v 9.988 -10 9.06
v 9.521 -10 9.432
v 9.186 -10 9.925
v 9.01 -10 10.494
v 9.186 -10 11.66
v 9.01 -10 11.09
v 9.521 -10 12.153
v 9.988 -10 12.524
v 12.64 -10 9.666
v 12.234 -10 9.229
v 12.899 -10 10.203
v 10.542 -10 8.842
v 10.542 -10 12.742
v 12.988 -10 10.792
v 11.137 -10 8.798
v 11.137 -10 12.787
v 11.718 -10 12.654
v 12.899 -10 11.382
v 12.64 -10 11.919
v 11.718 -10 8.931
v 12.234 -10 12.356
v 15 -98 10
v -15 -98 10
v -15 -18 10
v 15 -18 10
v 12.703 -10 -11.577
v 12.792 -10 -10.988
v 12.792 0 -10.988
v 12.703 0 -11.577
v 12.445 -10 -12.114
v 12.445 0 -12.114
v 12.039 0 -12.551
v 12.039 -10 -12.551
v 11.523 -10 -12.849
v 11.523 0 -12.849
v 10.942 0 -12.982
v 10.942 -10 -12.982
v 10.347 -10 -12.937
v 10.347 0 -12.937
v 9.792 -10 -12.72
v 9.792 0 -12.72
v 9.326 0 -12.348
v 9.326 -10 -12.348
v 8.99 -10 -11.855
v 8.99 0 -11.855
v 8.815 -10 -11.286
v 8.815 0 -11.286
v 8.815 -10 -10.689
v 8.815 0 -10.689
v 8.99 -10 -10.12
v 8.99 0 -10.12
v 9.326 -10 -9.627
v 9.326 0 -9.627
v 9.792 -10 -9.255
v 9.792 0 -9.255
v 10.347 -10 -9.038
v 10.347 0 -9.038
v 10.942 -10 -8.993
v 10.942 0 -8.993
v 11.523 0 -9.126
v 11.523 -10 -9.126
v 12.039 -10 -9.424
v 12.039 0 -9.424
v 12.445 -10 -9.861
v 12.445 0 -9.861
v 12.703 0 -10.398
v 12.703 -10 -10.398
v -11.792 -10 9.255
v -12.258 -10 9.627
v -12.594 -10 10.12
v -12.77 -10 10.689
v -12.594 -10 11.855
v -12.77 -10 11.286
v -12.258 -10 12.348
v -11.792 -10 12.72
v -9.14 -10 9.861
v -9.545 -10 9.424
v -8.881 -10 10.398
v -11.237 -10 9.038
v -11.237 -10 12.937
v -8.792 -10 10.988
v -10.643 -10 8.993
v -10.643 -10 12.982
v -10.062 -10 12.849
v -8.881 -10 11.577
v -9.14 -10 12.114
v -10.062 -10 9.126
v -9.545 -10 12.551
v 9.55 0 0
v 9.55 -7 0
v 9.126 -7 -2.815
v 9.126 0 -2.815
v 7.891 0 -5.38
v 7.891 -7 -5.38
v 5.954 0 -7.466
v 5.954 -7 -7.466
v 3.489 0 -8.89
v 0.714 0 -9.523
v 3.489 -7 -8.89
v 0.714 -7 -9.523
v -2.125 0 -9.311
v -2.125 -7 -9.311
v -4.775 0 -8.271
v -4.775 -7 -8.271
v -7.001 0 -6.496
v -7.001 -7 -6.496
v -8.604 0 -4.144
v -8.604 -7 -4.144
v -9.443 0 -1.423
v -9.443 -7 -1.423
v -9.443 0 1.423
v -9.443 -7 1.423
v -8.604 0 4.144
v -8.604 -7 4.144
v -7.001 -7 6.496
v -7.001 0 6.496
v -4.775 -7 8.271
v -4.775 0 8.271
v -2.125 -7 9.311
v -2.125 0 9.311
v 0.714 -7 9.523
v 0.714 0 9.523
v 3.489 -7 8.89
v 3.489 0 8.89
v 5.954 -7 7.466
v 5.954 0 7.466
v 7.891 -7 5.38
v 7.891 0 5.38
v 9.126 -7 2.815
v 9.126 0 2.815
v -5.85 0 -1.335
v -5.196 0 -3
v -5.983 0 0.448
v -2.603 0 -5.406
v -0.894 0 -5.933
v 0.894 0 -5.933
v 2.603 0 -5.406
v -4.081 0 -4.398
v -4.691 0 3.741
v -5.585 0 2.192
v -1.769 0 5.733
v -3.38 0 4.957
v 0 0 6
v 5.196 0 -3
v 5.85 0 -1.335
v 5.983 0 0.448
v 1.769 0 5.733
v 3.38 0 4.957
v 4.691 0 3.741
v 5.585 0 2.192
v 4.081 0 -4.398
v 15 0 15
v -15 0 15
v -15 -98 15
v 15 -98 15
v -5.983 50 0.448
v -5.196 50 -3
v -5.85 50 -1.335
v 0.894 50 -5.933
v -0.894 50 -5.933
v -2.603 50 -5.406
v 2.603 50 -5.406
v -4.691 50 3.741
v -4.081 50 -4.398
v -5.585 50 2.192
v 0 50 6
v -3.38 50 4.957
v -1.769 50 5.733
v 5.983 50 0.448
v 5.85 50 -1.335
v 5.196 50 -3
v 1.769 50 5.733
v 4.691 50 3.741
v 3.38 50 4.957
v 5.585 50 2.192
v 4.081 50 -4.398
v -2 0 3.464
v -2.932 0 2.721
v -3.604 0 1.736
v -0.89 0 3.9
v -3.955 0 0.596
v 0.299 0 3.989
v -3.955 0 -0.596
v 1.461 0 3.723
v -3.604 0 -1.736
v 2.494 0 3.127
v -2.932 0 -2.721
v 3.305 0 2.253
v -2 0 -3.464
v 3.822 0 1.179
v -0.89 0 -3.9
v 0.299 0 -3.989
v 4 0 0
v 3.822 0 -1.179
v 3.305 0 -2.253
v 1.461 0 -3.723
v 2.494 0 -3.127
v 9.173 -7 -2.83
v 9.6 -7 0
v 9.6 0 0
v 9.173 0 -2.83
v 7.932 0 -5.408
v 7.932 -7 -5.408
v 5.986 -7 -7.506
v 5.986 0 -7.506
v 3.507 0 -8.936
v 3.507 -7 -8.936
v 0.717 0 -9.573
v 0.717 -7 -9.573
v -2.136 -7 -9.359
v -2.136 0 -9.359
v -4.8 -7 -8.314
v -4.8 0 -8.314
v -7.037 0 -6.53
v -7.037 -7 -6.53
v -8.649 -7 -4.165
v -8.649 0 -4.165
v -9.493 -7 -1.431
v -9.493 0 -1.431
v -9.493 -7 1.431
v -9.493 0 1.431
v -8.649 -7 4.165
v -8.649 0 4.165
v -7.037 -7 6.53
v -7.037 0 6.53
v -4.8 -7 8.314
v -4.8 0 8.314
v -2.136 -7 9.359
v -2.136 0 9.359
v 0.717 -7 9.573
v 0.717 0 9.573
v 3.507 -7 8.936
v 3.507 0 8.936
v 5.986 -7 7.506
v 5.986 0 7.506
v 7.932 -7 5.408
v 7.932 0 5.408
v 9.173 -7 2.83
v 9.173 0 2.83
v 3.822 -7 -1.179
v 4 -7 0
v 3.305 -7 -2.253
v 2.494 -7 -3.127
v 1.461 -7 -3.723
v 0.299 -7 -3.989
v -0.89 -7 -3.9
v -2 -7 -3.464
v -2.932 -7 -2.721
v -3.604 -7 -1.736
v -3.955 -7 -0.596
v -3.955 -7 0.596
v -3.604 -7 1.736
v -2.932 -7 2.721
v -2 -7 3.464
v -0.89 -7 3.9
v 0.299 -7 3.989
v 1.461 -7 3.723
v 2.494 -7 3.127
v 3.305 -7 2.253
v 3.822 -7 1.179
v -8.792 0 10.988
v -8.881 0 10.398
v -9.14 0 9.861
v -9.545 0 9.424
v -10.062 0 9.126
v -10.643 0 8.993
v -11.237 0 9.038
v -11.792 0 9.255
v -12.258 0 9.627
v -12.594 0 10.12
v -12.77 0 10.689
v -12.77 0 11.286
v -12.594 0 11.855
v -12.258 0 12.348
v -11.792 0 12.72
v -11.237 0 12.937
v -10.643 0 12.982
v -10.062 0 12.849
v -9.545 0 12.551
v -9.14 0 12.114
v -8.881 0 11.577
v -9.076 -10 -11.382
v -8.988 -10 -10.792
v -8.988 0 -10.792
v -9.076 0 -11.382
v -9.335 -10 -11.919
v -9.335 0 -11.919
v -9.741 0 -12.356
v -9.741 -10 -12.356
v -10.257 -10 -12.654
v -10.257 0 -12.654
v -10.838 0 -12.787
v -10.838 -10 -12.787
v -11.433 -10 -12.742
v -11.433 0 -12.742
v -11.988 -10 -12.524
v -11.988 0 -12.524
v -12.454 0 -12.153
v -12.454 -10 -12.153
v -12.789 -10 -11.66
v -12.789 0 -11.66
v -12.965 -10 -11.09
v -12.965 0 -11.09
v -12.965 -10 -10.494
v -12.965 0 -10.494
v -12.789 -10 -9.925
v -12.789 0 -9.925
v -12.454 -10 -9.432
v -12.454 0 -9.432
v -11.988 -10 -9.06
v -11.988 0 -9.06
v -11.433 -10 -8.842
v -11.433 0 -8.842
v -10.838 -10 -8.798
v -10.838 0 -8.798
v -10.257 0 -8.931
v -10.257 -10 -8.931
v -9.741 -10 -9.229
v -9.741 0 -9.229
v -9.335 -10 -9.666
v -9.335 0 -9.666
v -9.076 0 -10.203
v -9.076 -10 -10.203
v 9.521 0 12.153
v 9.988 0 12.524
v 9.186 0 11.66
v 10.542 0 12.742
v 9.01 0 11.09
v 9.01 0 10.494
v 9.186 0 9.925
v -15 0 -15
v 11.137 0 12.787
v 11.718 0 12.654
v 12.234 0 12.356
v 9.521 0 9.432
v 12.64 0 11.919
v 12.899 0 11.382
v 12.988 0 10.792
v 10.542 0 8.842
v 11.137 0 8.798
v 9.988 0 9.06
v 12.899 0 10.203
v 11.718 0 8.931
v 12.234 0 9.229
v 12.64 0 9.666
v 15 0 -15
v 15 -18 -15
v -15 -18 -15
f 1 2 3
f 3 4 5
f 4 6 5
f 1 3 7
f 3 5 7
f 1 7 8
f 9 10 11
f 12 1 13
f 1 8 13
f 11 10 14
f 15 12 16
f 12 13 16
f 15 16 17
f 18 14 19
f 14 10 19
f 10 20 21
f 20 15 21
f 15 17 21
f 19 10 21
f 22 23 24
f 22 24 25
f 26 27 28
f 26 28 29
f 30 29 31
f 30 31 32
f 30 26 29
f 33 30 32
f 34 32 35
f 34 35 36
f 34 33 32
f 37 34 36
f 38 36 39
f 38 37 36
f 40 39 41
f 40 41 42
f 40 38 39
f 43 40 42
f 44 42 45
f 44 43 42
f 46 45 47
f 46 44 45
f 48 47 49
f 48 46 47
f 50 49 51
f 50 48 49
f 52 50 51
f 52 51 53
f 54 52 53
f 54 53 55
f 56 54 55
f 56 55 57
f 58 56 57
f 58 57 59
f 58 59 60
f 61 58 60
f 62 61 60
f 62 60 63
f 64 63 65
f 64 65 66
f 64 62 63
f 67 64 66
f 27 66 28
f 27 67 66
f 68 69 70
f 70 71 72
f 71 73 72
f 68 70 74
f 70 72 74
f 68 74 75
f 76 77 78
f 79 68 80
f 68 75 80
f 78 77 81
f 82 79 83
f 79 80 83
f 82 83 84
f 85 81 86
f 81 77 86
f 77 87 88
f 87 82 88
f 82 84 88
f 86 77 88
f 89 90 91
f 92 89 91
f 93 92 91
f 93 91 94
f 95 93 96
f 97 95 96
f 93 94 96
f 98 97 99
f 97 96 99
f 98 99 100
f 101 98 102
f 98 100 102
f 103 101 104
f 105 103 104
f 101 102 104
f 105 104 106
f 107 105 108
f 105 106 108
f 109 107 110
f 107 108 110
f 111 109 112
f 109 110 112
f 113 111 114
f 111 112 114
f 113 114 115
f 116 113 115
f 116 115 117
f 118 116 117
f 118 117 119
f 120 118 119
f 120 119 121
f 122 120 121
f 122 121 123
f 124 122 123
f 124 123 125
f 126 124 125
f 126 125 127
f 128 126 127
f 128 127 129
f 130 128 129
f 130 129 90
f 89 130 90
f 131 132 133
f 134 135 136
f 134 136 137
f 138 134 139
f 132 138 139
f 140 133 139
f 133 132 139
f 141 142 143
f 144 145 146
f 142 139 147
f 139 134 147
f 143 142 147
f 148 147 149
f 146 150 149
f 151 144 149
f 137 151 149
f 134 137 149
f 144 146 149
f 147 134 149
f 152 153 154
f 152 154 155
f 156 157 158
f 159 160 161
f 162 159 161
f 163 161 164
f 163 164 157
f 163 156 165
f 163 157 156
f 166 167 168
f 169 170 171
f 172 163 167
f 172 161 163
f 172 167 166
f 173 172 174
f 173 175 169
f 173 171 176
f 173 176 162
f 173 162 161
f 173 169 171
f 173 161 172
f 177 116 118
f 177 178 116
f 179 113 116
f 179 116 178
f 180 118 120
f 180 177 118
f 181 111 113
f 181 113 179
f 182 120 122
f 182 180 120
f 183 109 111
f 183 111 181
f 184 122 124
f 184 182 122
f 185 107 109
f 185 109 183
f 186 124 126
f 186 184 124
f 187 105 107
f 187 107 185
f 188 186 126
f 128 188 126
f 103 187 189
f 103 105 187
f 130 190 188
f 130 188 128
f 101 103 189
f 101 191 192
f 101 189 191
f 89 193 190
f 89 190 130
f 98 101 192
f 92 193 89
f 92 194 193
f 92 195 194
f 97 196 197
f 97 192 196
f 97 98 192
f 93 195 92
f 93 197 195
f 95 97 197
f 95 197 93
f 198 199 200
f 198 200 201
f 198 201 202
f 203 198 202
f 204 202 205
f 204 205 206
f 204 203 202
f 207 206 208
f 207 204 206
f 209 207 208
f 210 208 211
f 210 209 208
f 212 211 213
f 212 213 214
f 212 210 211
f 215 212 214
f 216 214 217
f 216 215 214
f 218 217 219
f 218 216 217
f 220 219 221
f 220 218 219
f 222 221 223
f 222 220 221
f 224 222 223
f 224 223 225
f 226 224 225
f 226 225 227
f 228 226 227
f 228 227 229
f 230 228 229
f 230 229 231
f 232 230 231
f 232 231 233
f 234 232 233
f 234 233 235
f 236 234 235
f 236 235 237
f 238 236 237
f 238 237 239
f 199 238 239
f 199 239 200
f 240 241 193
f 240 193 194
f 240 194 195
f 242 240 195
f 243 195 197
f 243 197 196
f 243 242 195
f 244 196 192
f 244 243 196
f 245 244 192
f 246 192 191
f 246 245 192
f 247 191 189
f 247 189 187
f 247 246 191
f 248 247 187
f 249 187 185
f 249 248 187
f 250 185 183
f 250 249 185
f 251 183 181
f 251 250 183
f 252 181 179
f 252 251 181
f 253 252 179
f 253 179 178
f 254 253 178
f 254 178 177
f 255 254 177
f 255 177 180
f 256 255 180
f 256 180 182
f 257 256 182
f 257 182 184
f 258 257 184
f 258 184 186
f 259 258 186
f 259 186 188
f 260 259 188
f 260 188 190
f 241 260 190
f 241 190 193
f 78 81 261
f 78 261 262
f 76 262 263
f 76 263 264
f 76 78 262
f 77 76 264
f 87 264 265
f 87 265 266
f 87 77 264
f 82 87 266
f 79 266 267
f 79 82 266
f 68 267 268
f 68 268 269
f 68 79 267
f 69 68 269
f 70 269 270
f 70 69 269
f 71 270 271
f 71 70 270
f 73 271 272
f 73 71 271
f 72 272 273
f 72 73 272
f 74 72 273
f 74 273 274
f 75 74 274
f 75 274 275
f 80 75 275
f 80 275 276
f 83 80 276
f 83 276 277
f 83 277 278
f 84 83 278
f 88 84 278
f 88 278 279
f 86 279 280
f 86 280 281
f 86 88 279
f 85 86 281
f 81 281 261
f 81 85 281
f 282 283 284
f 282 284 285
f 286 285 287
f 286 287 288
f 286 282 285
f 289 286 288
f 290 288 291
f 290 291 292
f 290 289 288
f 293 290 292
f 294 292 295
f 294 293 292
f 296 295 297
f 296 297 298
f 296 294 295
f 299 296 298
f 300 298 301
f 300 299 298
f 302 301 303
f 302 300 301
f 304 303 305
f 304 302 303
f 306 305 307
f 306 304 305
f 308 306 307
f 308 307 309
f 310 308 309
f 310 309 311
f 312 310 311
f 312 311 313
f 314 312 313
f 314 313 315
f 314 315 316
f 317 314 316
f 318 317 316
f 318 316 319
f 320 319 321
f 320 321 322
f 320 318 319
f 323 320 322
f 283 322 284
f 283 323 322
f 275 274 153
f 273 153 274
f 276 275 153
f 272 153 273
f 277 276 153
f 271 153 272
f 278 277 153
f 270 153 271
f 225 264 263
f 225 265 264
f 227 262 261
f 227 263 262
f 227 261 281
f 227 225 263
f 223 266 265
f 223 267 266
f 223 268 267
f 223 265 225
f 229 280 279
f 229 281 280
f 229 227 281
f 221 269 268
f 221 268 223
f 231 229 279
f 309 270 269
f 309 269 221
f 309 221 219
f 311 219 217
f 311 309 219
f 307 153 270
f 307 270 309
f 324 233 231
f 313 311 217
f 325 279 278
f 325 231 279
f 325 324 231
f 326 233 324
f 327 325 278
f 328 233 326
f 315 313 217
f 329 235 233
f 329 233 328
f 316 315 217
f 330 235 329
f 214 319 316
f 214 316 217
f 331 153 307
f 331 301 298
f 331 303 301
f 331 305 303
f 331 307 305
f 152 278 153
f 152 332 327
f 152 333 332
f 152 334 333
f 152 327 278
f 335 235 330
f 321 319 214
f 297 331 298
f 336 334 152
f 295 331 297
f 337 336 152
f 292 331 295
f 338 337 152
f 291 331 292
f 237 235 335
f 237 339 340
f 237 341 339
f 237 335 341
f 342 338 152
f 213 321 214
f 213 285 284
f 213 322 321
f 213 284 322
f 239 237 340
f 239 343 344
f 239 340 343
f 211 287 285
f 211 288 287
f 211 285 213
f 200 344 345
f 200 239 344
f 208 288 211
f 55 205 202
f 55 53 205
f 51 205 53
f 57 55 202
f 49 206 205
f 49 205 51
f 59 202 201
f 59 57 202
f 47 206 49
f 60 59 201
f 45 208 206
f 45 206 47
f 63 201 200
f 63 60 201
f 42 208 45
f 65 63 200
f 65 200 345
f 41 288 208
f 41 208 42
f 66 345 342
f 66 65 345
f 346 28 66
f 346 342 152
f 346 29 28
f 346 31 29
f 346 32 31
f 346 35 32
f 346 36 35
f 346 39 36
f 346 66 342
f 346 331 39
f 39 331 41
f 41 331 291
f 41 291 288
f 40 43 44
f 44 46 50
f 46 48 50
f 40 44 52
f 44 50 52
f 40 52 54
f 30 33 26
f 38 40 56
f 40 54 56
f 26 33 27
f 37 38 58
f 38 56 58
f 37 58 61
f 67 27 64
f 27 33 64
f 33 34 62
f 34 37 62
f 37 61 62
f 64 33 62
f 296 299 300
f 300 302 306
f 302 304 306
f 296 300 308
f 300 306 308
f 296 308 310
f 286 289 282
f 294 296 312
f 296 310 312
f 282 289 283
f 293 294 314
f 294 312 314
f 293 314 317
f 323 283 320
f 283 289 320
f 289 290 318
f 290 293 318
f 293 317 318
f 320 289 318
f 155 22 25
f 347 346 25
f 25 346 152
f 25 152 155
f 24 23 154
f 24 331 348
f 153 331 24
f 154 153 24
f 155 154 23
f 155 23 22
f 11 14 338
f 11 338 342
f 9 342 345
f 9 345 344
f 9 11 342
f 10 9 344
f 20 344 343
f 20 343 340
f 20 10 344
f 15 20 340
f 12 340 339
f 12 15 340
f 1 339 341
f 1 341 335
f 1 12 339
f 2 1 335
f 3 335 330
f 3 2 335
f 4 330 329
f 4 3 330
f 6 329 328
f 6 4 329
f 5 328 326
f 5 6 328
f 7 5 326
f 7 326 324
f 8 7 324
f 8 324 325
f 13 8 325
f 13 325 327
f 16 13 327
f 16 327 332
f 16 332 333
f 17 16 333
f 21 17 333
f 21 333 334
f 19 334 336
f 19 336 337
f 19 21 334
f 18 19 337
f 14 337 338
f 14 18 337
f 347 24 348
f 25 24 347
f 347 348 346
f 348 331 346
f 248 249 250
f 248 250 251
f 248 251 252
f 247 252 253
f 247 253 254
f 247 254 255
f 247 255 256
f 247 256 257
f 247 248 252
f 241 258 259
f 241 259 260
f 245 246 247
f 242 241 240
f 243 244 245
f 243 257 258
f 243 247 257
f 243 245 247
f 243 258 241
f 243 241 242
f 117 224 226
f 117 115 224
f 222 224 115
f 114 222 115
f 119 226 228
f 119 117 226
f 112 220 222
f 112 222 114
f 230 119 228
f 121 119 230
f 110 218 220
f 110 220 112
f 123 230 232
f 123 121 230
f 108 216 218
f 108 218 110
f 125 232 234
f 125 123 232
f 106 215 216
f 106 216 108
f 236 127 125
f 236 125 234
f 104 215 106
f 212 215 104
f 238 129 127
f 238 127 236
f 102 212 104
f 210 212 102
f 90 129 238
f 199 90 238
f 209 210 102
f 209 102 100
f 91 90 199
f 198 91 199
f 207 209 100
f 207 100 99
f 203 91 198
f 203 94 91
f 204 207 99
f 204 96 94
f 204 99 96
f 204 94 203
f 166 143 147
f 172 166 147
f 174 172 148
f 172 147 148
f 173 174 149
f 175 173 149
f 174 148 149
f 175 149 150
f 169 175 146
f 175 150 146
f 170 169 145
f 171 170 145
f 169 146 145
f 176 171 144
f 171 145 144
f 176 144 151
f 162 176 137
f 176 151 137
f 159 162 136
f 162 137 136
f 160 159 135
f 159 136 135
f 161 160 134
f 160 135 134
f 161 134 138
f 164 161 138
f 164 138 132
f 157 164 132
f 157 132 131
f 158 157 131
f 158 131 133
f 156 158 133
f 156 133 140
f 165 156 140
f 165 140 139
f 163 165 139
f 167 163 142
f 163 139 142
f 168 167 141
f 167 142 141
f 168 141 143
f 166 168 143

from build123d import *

# Parameters (mm, degrees)
SKETCH1_R                  = 6
BOSS_EXTRUDE1_DEPTH        = 50
BALL_START                 = -10
BALL_BEARING_OUTLINE_W     = 30
BALL_BEARING_OUTLINE_H     = 30
BALL_BEARING_OUTLINE_R     = 2
BALL_BEARING_OUTLINE_R_2   = 9.6
BALL_BEARING_OUTLINE_R_3   = 9.55
BALL_BEARING_OUTLINE_R_4   = 4
BALL_BEARING_DEPTH         = 10
BALL_BEARING_2_OUTLINE_R   = 9.6
BALL_BEARING_2_OUTLINE_R_2 = 9.55
BALL_BEARING_2_OUTLINE_R_3 = 4
BALL_BEARING_2_DEPTH       = 3
SKETCH6_W                  = 30
SKETCH6_H                  = 30
BOSS_EXTRUDE2_DEPTH        = 8
SKETCH7_W                  = 30
SKETCH7_H                  = 5
BOSS_EXTRUDE3_DEPTH        = 80


# Read off the part's stored shape, not the designer's step: ball bearing
with BuildPart() as part:
    # Sketch1 → Boss-Extrude1 (new body)
    with BuildSketch(Plane(origin=(0, 0, 0), x_dir=(1, 0, 0), z_dir=(0, 1, 0))):
        with Locations(Location((0, 0, 0), (0, 0, 270))):
            Circle(SKETCH1_R)
    extrude(amount=BOSS_EXTRUDE1_DEPTH)


with BuildPart() as body_2:
    # ball bearing outline → ball bearing (new body)
    # profile 1 of 2: a face of its own
    with BuildSketch(Plane(origin=(0, 0, 0), x_dir=(1, 0, 0), z_dir=(0, 1, 0)).offset(BALL_START)):
        Rectangle(BALL_BEARING_OUTLINE_W, BALL_BEARING_OUTLINE_H)
        with Locations((-10.792349727, -10.987509758)):
            Circle(BALL_BEARING_OUTLINE_R, mode=Mode.SUBTRACT)
        with Locations((10.987509758, -10.792349727)):
            Circle(BALL_BEARING_OUTLINE_R, mode=Mode.SUBTRACT)
        with Locations((-10.987509758, 10.792349727)):
            Circle(BALL_BEARING_OUTLINE_R, mode=Mode.SUBTRACT)
        Circle(BALL_BEARING_OUTLINE_R_2, mode=Mode.SUBTRACT)
        with Locations((10.792349727, 10.987509758)):
            Circle(BALL_BEARING_OUTLINE_R, mode=Mode.SUBTRACT)
    # profile 2 of 2: a face of its own
    with BuildSketch(Plane(origin=(0, 0, 0), x_dir=(1, 0, 0), z_dir=(0, 1, 0)).offset(BALL_START)):
        Circle(BALL_BEARING_OUTLINE_R_3)
        Circle(BALL_BEARING_OUTLINE_R_4, mode=Mode.SUBTRACT)
    extrude(amount=BALL_BEARING_DEPTH)

    # ball bearing 2 outline → ball bearing 2 (add)
    # profile 1 of 2: a face of its own
    with BuildSketch(Plane(origin=(0, 0, 0), x_dir=(1, 0, 0), z_dir=(0, 1, 0)).offset(BALL_START)):
        Circle(BALL_BEARING_2_OUTLINE_R)
        Circle(BALL_BEARING_2_OUTLINE_R_2, mode=Mode.SUBTRACT)
    # profile 2 of 2: a face of its own
    with BuildSketch(Plane(origin=(0, 0, 0), x_dir=(1, 0, 0), z_dir=(0, 1, 0)).offset(BALL_START)):
        Circle(BALL_BEARING_2_OUTLINE_R_3)
    extrude(amount=BALL_BEARING_2_DEPTH)

    # Sketch6 → Boss-Extrude2 (add)
    with BuildSketch(Plane.XZ.offset(10)):
        Rectangle(SKETCH6_W, SKETCH6_H)
    extrude(amount=BOSS_EXTRUDE2_DEPTH)

    # Sketch7 → Boss-Extrude3 (add)
    with BuildSketch(Plane.XZ.offset(18)):
        with Locations((0, 12.5)):
            Rectangle(SKETCH7_W, SKETCH7_H)
    extrude(amount=BOSS_EXTRUDE3_DEPTH)


solid = Compound([part.part, body_2.part])
